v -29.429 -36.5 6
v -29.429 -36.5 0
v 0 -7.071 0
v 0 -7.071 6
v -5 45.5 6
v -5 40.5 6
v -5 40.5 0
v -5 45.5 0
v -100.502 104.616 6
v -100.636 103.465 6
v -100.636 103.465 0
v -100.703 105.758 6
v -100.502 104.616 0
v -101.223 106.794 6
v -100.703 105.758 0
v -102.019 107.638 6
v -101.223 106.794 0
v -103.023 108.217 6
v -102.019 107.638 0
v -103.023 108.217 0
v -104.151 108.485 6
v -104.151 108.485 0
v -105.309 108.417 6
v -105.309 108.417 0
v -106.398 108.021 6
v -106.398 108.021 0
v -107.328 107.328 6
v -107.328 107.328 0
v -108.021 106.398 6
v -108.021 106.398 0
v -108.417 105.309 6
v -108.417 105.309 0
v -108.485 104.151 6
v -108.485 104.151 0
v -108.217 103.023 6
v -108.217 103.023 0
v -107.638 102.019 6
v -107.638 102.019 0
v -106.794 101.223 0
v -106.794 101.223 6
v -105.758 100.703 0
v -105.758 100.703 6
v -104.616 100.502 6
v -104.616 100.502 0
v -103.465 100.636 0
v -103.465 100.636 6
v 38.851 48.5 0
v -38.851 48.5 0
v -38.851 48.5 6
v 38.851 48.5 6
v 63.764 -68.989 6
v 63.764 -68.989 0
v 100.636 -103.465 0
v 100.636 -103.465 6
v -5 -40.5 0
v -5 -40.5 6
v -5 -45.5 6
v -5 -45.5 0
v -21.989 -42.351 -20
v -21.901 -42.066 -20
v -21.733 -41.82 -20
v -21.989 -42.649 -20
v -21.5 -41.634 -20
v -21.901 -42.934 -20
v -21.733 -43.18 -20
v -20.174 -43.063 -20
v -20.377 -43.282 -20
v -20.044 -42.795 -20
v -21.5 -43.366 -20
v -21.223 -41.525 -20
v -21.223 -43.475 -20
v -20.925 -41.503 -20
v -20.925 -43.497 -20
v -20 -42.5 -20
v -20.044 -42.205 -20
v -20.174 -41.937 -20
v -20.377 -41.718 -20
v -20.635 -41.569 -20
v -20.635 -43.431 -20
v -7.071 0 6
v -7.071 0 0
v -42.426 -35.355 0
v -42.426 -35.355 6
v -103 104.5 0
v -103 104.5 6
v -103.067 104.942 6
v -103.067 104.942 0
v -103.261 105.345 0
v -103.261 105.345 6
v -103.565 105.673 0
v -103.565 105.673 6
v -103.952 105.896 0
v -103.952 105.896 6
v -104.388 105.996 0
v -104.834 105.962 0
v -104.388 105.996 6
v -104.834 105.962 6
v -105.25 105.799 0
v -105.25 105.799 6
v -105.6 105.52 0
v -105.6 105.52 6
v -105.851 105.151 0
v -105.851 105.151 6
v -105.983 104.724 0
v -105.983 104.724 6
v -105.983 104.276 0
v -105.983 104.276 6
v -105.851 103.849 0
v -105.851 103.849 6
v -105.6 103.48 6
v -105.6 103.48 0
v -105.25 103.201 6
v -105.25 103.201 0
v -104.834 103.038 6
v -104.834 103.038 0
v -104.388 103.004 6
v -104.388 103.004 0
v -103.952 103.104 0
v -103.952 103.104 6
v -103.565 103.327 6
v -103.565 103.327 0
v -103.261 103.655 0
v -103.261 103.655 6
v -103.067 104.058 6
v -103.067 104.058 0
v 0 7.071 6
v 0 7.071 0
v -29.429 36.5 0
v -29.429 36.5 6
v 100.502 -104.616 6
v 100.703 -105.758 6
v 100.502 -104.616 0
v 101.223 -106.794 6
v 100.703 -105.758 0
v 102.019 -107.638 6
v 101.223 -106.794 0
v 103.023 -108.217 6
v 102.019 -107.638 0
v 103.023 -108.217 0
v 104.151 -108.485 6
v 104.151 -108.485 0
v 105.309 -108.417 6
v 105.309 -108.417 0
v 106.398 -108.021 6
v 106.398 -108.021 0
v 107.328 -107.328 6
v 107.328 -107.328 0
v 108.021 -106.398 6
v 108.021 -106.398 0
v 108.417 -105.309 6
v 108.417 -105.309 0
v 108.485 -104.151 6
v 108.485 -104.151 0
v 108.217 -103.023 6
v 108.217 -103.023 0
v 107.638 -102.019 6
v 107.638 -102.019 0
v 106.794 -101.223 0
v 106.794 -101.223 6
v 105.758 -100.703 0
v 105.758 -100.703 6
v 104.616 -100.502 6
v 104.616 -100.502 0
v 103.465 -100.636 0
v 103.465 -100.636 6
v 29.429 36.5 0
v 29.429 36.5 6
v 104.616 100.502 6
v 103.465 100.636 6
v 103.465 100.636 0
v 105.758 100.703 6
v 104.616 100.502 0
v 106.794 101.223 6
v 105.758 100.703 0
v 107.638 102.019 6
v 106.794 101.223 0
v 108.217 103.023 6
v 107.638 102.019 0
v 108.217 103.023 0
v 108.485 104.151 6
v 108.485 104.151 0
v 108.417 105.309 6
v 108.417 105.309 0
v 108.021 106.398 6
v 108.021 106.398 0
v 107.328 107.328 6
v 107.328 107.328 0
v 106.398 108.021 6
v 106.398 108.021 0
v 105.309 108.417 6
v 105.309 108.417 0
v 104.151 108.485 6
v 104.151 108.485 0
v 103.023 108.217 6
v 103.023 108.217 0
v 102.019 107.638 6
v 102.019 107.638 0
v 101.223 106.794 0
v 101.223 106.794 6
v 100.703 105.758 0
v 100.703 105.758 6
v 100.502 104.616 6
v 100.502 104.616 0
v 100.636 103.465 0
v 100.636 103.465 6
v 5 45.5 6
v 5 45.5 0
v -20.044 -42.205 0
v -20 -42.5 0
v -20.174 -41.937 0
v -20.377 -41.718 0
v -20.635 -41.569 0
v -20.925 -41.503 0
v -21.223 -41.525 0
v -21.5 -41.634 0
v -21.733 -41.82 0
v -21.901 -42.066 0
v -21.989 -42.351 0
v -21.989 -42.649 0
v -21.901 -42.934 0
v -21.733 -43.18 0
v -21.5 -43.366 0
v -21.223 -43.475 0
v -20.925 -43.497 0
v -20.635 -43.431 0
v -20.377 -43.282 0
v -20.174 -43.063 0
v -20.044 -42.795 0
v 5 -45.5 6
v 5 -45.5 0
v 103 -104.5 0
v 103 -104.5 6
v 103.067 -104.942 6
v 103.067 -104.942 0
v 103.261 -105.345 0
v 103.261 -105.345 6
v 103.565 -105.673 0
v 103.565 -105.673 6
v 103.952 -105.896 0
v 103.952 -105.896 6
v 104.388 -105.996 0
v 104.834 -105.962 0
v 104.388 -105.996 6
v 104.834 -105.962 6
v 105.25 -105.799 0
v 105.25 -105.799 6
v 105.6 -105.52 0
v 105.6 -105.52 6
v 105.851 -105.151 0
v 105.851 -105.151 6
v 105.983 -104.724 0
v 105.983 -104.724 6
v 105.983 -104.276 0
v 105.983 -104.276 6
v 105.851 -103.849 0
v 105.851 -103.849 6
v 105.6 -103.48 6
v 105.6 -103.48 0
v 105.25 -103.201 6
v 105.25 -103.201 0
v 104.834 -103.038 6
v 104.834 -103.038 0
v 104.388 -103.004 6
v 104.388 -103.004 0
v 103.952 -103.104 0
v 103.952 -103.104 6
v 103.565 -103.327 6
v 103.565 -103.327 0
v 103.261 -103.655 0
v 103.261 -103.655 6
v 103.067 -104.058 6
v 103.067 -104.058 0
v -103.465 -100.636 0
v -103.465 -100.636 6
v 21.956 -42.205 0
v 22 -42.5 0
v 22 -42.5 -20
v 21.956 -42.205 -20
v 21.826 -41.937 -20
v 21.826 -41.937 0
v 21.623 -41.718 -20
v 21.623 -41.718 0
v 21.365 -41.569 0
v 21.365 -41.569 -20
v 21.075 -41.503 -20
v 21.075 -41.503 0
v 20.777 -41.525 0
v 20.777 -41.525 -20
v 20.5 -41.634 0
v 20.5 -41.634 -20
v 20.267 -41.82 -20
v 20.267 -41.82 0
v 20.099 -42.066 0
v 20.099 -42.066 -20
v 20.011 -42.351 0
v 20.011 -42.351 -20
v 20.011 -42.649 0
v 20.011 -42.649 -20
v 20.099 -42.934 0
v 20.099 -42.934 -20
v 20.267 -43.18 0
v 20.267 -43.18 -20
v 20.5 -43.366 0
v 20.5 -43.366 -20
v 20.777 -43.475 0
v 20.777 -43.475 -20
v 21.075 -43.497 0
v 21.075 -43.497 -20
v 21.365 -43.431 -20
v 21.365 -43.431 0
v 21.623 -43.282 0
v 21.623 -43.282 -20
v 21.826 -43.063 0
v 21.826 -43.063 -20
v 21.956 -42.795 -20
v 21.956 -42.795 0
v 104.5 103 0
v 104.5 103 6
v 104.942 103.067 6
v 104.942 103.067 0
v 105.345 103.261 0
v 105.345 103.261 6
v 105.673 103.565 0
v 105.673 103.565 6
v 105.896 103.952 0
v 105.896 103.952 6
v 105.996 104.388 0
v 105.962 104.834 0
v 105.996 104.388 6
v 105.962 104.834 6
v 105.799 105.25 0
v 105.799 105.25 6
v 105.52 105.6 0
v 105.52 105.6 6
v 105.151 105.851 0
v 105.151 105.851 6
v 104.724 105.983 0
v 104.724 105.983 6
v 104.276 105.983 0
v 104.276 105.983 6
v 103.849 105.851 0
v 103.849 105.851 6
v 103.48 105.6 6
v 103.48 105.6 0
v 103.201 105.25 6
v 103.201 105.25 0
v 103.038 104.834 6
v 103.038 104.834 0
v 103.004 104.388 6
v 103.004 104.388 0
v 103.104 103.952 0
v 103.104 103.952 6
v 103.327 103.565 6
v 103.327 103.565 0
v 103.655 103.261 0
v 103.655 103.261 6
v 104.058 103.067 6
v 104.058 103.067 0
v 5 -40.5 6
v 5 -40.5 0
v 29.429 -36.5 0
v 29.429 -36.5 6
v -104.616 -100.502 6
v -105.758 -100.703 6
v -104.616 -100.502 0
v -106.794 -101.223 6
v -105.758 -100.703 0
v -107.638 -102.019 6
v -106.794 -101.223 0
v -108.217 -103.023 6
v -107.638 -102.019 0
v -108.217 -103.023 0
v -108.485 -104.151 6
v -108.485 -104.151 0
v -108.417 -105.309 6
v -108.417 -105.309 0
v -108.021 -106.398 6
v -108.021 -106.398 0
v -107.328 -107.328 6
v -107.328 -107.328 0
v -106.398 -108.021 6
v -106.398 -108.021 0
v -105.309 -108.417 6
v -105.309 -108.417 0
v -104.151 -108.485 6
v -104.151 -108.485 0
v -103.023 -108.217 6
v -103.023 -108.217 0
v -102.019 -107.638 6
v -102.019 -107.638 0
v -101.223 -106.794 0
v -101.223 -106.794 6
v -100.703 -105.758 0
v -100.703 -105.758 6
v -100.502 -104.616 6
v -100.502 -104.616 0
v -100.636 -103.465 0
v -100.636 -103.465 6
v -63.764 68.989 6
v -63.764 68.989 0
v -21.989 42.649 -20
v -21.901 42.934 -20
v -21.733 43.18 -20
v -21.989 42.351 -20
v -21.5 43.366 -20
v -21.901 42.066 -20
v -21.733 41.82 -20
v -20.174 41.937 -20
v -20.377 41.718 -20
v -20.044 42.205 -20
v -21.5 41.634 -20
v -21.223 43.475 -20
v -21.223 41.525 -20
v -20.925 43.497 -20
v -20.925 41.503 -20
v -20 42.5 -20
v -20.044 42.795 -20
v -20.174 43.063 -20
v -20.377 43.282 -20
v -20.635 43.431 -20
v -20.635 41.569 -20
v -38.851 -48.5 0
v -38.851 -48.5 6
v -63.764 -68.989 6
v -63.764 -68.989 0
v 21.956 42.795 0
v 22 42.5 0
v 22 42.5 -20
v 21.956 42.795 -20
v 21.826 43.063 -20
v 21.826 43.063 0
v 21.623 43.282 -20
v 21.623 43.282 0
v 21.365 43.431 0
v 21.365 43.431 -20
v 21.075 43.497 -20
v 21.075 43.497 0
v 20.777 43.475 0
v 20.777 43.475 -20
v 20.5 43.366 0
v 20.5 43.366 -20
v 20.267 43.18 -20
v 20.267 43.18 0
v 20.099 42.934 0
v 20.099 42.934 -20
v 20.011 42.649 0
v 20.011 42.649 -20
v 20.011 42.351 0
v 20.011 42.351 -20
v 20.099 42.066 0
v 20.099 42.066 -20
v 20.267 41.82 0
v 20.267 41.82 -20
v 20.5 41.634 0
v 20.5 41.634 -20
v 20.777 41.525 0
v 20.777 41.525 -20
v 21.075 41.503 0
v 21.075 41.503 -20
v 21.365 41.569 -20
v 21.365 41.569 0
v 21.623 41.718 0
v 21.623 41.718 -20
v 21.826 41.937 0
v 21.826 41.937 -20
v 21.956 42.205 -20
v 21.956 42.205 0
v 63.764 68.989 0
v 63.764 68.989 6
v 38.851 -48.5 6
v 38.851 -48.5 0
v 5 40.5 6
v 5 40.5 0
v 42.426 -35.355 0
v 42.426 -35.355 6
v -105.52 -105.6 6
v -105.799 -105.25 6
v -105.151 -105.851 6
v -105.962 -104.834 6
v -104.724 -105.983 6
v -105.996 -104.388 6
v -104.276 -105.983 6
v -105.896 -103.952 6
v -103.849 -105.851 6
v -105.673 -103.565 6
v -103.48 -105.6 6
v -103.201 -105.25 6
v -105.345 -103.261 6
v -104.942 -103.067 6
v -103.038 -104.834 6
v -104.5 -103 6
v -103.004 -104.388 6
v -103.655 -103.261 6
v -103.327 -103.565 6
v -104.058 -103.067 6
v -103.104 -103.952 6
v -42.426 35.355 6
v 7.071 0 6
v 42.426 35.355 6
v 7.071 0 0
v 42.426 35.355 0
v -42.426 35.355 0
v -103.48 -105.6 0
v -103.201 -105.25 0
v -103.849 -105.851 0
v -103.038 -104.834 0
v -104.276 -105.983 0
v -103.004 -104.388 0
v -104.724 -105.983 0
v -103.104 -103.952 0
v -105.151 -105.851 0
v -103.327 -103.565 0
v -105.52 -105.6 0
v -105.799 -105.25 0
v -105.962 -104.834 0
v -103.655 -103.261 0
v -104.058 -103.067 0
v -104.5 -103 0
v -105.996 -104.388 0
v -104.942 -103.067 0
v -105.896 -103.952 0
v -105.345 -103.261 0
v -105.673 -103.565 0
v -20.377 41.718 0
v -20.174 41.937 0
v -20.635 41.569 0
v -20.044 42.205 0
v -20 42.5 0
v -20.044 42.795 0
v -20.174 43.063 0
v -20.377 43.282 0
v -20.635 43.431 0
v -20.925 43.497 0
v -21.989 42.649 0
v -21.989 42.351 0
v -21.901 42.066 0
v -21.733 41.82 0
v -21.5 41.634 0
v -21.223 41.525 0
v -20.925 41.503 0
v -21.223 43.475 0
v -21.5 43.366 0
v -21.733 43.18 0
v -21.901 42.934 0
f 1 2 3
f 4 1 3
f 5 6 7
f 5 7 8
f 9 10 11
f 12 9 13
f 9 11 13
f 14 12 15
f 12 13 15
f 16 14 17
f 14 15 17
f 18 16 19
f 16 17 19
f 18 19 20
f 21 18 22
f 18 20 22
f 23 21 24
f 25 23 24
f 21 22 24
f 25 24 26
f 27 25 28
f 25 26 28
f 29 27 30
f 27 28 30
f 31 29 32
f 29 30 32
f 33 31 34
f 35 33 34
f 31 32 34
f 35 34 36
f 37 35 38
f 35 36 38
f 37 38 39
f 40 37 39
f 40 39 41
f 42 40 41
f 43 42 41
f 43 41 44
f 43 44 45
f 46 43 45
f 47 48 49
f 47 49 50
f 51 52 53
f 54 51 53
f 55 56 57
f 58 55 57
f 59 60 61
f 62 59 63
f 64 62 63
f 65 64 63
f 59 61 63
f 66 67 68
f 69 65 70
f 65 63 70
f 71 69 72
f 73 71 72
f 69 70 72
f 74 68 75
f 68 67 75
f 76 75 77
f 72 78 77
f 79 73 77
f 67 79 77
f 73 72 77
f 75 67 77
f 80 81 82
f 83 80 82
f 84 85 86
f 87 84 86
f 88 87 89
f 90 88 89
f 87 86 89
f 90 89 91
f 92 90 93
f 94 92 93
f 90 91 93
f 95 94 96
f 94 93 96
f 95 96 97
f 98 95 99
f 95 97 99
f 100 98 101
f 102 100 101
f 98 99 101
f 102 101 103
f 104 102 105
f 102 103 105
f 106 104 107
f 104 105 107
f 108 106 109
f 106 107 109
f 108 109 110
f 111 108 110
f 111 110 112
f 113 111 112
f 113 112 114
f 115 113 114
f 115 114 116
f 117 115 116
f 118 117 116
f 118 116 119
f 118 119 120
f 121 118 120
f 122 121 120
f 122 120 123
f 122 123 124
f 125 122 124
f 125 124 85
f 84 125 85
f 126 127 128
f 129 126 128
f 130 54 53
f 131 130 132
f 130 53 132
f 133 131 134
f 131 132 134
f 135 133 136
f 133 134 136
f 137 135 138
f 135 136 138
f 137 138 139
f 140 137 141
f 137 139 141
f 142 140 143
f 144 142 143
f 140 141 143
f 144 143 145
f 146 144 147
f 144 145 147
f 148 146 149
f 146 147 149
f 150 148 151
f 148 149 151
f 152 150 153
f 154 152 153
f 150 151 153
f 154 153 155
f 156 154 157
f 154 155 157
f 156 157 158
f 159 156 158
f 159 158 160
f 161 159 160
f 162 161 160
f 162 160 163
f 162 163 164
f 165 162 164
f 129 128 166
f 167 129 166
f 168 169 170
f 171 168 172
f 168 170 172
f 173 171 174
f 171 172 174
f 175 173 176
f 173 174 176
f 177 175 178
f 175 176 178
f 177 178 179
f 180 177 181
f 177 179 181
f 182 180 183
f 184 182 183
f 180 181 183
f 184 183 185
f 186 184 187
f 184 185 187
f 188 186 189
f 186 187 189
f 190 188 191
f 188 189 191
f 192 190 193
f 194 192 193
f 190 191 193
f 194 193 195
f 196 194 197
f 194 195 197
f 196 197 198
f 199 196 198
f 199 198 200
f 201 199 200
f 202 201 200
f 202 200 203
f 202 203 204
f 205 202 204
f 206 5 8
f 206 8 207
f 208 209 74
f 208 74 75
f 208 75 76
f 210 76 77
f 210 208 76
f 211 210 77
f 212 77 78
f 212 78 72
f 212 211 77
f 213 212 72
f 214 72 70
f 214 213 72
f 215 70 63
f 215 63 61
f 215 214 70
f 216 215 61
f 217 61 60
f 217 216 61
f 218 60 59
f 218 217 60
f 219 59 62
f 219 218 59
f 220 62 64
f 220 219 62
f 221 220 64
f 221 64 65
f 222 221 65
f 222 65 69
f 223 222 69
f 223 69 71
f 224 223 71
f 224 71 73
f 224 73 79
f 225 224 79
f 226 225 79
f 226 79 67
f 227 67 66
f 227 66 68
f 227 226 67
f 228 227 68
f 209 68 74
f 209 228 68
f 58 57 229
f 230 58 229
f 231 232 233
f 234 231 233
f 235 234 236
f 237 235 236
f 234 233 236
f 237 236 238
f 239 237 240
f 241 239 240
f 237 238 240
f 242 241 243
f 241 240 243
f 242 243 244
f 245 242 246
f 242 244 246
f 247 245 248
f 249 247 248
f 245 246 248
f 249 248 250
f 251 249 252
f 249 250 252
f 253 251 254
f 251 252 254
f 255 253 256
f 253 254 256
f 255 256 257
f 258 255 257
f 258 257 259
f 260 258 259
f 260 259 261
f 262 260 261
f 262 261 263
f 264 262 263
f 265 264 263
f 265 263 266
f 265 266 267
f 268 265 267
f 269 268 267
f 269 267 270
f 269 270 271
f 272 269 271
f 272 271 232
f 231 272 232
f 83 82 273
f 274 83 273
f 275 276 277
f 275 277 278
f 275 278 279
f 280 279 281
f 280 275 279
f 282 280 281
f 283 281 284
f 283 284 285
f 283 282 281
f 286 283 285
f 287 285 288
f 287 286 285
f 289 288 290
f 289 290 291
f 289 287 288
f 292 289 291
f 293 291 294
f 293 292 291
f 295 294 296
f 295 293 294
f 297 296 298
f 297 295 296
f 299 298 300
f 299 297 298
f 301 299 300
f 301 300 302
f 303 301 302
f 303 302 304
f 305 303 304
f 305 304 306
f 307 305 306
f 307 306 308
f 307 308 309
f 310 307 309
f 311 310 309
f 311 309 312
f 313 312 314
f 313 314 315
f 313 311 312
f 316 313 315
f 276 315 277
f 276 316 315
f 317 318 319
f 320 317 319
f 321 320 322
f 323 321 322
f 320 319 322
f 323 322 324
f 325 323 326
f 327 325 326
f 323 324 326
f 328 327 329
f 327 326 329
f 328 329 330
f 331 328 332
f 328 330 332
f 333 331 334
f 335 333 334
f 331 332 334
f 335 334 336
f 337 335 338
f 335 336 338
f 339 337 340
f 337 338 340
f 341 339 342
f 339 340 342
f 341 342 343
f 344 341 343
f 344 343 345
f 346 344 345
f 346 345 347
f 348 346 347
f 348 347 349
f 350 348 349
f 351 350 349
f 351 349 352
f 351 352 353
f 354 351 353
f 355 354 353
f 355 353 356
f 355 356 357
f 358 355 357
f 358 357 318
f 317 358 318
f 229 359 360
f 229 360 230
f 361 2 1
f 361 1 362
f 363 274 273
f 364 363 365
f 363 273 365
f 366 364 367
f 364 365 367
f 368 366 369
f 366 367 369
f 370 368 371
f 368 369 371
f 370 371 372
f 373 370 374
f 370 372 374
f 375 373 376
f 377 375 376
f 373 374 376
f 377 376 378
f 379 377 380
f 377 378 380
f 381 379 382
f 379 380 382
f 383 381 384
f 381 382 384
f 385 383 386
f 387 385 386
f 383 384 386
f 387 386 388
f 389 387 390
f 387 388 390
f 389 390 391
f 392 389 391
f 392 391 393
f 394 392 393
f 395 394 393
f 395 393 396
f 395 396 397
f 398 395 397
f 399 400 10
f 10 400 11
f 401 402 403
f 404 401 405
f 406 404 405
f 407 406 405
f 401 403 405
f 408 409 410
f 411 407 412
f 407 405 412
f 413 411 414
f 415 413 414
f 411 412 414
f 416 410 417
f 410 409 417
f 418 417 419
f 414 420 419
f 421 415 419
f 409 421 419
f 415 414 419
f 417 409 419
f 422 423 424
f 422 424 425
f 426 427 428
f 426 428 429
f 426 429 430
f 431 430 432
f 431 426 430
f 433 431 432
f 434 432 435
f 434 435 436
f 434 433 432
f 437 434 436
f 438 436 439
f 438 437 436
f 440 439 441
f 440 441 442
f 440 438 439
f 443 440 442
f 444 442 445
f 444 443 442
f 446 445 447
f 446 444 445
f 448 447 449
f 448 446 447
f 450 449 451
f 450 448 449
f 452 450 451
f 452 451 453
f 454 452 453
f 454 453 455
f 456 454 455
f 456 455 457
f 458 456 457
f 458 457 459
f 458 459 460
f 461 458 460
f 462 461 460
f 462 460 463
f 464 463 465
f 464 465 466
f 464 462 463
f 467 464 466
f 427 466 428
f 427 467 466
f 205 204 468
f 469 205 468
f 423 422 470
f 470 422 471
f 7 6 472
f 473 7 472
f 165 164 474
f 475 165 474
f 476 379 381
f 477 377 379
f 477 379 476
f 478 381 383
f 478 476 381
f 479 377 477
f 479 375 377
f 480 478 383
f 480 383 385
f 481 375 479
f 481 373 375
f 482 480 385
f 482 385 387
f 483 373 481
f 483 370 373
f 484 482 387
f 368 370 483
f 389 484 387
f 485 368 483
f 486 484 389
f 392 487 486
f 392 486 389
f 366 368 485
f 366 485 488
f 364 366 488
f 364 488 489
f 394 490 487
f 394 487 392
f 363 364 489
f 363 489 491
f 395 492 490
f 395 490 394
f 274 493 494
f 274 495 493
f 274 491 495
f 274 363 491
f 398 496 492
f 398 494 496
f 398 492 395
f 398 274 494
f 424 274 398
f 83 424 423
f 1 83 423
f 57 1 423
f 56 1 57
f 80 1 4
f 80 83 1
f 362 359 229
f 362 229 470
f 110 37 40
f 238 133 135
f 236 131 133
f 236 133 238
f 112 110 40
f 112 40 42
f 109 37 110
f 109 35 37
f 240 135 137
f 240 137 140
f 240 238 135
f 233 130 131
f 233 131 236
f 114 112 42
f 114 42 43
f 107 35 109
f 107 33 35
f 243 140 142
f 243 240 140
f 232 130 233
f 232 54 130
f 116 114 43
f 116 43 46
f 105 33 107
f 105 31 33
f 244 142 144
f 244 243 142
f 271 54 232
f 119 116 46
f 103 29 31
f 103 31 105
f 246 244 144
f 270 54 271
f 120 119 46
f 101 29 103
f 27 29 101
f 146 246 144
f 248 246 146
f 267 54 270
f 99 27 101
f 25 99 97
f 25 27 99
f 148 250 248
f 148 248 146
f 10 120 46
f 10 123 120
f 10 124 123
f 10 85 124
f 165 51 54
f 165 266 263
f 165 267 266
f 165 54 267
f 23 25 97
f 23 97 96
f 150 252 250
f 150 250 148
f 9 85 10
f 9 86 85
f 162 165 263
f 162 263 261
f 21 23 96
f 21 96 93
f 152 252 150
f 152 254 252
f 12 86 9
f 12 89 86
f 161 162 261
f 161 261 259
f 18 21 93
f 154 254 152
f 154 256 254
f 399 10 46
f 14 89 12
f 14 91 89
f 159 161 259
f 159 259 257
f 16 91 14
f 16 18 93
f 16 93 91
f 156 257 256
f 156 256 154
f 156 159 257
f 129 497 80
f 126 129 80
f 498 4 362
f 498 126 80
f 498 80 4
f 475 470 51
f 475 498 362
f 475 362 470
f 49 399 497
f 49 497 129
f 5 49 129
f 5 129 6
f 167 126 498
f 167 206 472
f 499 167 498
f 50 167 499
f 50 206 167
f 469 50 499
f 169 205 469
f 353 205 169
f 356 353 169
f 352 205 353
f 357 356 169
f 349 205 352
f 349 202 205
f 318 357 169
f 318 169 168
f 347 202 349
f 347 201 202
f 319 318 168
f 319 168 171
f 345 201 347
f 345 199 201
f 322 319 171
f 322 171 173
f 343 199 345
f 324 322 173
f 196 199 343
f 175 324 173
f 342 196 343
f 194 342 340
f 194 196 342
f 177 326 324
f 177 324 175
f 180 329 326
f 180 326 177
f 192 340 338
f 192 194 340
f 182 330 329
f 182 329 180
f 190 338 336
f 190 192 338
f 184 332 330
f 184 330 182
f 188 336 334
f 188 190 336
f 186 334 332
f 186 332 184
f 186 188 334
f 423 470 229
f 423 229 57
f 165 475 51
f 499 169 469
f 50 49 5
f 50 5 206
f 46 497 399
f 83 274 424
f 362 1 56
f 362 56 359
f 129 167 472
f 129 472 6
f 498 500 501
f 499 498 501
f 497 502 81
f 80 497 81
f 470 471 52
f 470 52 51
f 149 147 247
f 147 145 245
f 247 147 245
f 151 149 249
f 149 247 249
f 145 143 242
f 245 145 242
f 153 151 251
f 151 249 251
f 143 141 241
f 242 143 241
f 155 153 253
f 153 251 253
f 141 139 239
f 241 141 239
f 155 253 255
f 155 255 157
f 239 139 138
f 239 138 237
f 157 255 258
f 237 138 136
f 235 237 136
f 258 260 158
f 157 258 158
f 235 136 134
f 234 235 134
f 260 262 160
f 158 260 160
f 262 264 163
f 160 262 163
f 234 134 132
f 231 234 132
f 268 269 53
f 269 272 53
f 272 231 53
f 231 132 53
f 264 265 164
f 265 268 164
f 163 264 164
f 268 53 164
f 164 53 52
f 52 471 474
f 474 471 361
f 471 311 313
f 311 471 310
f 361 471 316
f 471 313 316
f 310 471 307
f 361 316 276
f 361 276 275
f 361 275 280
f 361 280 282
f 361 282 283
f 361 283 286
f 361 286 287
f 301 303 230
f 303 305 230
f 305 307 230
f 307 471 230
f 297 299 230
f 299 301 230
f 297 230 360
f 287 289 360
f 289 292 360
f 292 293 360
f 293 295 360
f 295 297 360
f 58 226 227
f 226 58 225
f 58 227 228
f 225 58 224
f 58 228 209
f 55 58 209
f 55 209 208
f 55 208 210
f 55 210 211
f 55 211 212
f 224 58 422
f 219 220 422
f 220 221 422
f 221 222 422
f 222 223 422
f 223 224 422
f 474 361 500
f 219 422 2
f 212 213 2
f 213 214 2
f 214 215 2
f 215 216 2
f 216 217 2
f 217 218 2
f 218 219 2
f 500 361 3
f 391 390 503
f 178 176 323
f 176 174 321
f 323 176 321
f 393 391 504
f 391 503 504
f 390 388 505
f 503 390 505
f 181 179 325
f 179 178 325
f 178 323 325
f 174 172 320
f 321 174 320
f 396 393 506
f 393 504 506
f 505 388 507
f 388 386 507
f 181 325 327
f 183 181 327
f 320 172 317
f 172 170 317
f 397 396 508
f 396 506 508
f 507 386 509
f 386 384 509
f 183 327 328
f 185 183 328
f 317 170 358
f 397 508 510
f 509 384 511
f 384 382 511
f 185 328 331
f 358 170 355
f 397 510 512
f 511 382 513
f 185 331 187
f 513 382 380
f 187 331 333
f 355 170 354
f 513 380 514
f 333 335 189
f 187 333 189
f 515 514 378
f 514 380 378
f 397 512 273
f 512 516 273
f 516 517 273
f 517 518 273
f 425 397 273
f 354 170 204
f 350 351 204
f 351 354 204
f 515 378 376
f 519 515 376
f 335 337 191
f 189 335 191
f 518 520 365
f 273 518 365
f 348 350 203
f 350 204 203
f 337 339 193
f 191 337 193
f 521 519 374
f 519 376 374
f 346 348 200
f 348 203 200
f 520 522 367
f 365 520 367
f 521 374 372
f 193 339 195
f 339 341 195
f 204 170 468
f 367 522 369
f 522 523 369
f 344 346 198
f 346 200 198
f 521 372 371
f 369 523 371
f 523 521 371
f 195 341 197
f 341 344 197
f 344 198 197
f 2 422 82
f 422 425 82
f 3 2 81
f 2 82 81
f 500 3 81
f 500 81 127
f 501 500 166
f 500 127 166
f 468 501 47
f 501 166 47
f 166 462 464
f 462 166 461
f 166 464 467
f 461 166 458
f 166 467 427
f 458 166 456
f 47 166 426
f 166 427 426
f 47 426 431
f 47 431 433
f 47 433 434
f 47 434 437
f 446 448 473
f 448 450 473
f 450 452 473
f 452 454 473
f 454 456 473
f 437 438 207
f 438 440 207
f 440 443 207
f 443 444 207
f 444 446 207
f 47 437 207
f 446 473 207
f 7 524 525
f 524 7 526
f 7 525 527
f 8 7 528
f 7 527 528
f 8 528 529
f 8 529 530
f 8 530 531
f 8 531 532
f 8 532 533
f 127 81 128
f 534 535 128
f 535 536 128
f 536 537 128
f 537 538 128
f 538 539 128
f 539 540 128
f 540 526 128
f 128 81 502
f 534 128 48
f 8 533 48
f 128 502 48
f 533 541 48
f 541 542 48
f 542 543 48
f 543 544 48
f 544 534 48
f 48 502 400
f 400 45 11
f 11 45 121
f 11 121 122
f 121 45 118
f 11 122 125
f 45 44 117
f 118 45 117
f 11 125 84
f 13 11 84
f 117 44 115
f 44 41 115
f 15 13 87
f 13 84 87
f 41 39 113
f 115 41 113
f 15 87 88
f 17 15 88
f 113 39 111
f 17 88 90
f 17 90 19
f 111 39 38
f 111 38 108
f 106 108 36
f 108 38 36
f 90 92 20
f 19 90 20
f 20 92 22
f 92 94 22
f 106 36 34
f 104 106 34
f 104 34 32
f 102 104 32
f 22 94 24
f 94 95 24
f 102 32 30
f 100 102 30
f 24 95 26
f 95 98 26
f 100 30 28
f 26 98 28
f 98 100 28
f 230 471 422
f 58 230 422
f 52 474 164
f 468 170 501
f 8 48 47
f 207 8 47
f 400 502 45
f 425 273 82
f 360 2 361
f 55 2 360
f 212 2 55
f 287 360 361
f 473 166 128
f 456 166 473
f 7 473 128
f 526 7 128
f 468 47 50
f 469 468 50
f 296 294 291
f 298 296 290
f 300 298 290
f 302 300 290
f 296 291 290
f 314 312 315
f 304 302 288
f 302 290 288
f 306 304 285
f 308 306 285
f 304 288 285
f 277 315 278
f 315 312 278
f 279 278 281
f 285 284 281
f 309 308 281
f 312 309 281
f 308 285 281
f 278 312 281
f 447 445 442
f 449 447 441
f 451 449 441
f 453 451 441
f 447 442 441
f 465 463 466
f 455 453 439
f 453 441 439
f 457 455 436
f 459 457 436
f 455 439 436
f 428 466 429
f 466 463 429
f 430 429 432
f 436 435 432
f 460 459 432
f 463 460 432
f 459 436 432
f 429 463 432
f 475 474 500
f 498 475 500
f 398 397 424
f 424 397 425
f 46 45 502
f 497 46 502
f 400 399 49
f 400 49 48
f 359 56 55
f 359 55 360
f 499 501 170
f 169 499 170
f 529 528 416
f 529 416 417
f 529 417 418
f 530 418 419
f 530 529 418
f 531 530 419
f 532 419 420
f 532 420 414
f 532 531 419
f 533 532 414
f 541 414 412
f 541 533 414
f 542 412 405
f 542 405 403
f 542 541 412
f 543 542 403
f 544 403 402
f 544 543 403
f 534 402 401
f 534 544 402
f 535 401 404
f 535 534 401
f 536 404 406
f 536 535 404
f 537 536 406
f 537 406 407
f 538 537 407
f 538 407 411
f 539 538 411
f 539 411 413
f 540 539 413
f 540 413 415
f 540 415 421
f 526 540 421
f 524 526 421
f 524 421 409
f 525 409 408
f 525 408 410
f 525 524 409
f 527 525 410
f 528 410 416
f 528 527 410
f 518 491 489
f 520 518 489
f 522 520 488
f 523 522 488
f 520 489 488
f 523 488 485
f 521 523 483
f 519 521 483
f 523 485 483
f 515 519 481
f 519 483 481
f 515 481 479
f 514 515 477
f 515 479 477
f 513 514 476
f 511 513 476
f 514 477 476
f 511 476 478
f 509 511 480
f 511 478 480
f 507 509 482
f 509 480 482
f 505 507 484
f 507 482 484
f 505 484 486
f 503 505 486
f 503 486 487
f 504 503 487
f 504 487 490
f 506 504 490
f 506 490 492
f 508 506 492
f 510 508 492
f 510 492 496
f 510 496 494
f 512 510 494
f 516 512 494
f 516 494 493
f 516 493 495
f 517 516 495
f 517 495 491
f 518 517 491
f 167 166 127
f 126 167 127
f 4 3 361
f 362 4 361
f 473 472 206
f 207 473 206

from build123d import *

# Parameters (mm, degrees)
F0_R         = 4
F1_DEPTH     = 6
F3_DEPTH     = 6
F4_R         = 1.5
F5_DEPTH     = 6.001
F6_COUNT     = 4
F8_W         = 85
F8_H         = 12
F9_DEPTH     = 6
F10_R        = 3.55
F10_R_2      = 2.5
F10_W        = 10
F10_H        = 5
F11_DEPTH    = 6.001
F12_C1_SIZE2 = 3
F12_C1_SIZE  = 30
F12_C2_SIZE2 = 30
F12_C2_SIZE  = 3
F12_C3_SIZE2 = 3
F12_C3_SIZE  = 30
F12_C4_SIZE2 = 30
F12_C4_SIZE  = 3
F13_R        = 1
F14_DEPTH    = 20
F15_R        = 3.55
F15_R_2      = 2.5
F16_DEPTH    = 6


# Not quite as in the source:
# - a pattern or mirror of a feature is missing from the dataset's text; its kind, count and spacing are read off the source's solid


with BuildPart() as f1:
    # F0 (on Top) → F1 (new body)
    with BuildSketch(Plane.XY):
        with Locations((-104.5, 104.5)):
            Circle(F0_R)
    extrude(amount=F1_DEPTH)

    # F2 (on Top) → F3 (join, through all)
    with BuildSketch(Plane.XY):
        Polygon((-7.0710678119, 0), (0, 0), (0, 7.0710678119), (-35.3553390593, 42.4264068712), (-100.6362966948, 103.4647238196), (-103.4647238196, 100.6362966948), (-42.4264068712, 35.3553390593), align=None)
    extrude(amount=F3_DEPTH)

    # F4 (on face) → F5 (cut, through all)
    with BuildSketch(Plane.XY.offset(6)):
        with Locations((-104.5, 104.5)):
            Circle(F4_R)
    extrude(amount=-F5_DEPTH, mode=Mode.SUBTRACT)


with BuildPart() as f6_1:
    # F6: instance of F1
    add(f1.part.rotate(Axis((0, 0, 3), (0, 0, -1)), 1 * 360 / F6_COUNT))


with BuildPart() as f6_2:
    # F6: instance of F1
    add(f1.part.rotate(Axis((0, 0, 3), (0, 0, -1)), 2 * 360 / F6_COUNT))


with BuildPart() as f6_3:
    # F6: instance of F1
    add(f1.part.rotate(Axis((0, 0, 3), (0, 0, -1)), 3 * 360 / F6_COUNT))


with BuildPart() as f1_1:
    add(f1.part)

    # F7: union F6_1, F6_2, F6_3
    add(f6_1.part)
    add(f6_2.part)
    add(f6_3.part)

    # F8 (on Top) → F9 (join, through all)
    with BuildSketch(Plane.XY):
        with Locations((0, 42.5)):
            Rectangle(F8_W, F8_H)
    f9 = extrude(amount=F9_DEPTH)

    # F9_copies: F9 across plane
    add(f9.mirror(Plane(origin=(0, 0, 0), x_dir=(0, 0, -1), z_dir=(0, -1, 0))))

    # F10 (on face) → F11 (cut, through all)
    with BuildSketch(Plane.XY.offset(6)):
        with Locations((-21, 42.5)):
            Circle(F10_R)
        with Locations((21, 42.5)):
            Circle(F10_R_2)
        with Locations((0, 43)):
            Rectangle(F10_W, F10_H)
    f11 = extrude(amount=-F11_DEPTH, mode=Mode.SUBTRACT)

    # F11_copies: F11 across plane
    add(f11.mirror(Plane(origin=(0, 0, 0), x_dir=(0, 0, -1), z_dir=(0, -1, 0))), mode=Mode.SUBTRACT)

    # F12: chamfer of 3 x 30 on 4 edges, made by hand

    # F12_c1
    f12_c1_edges = [f1_1.edges().sort_by_distance(p)[0] for p in [
        (-41.8510944399, 48.5, 3),
    ]]
    f12_c1_side = f1_1.faces().sort_by_distance((-41.8949210948, 48.5409783396, 3))[0]
    chamfer(f12_c1_edges, length=F12_C1_SIZE, length2=F12_C1_SIZE2, reference=f12_c1_side)

    # F12_c2
    f12_c2_edges = [f1_1.edges().sort_by_distance(p)[0] for p in [
        (41.8510944399, 48.5, 3),
    ]]
    f12_c2_side = f1_1.faces().sort_by_distance((41.7910944399, 48.5, 3))[0]
    chamfer(f12_c2_edges, length=F12_C2_SIZE, length2=F12_C2_SIZE2, reference=f12_c2_side)

    # F12_c3
    f12_c3_edges = [f1_1.edges().sort_by_distance(p)[0] for p in [
        (41.8510944399, -48.5, 3),
    ]]
    f12_c3_side = f1_1.faces().sort_by_distance((41.8949210948, -48.5409783396, 3))[0]
    chamfer(f12_c3_edges, length=F12_C3_SIZE, length2=F12_C3_SIZE2, reference=f12_c3_side)

    # F12_c4
    f12_c4_edges = [f1_1.edges().sort_by_distance(p)[0] for p in [
        (-41.8510944399, -48.5, 3),
    ]]
    f12_c4_side = f1_1.faces().sort_by_distance((-41.7910944399, -48.5, 3))[0]
    chamfer(f12_c4_edges, length=F12_C4_SIZE, length2=F12_C4_SIZE2, reference=f12_c4_side)



with BuildPart() as f14:
    # F13 (on Top) → F14 (new body)
    with BuildSketch(Plane.XY):
        with Locations((-21, 42.5)):
            Circle(F13_R)
    extrude(amount=-F14_DEPTH)


with BuildPart() as f14b:
    # F13 (on Top) → F14, piece 2 (new body)
    with BuildSketch(Plane.XY):
        with Locations((21, 42.5)):
            Circle(F13_R)
    extrude(amount=-F14_DEPTH)


with BuildPart() as f14c:
    # F13 (on Top) → F14, piece 3 (new body)
    with BuildSketch(Plane.XY):
        with Locations((-21, -42.5)):
            Circle(F13_R)
    extrude(amount=-F14_DEPTH)


with BuildPart() as f14d:
    # F13 (on Top) → F14, piece 4 (new body)
    with BuildSketch(Plane.XY):
        with Locations((21, -42.5)):
            Circle(F13_R)
    extrude(amount=-F14_DEPTH)


with BuildPart() as f1_2:
    add(f1_1.part)

    add(f14.part)  # F16 merges F14

    add(f14b.part)  # F16 merges F14b

    add(f14c.part)  # F16 merges F14c

    add(f14d.part)  # F16 merges F14d
    # F15 (on face) → F16 (join)
    with BuildSketch(Plane.XY.offset(6)):
        with Locations((-21, -42.5)):
            Circle(F15_R)
        with Locations((21, -42.5)):
            Circle(F15_R_2)
        with Locations((21, 42.5)):
            Circle(F15_R_2)
        with Locations((-21, 42.5)):
            Circle(F15_R)
    extrude(amount=-F16_DEPTH)


solid = f1_2.part
